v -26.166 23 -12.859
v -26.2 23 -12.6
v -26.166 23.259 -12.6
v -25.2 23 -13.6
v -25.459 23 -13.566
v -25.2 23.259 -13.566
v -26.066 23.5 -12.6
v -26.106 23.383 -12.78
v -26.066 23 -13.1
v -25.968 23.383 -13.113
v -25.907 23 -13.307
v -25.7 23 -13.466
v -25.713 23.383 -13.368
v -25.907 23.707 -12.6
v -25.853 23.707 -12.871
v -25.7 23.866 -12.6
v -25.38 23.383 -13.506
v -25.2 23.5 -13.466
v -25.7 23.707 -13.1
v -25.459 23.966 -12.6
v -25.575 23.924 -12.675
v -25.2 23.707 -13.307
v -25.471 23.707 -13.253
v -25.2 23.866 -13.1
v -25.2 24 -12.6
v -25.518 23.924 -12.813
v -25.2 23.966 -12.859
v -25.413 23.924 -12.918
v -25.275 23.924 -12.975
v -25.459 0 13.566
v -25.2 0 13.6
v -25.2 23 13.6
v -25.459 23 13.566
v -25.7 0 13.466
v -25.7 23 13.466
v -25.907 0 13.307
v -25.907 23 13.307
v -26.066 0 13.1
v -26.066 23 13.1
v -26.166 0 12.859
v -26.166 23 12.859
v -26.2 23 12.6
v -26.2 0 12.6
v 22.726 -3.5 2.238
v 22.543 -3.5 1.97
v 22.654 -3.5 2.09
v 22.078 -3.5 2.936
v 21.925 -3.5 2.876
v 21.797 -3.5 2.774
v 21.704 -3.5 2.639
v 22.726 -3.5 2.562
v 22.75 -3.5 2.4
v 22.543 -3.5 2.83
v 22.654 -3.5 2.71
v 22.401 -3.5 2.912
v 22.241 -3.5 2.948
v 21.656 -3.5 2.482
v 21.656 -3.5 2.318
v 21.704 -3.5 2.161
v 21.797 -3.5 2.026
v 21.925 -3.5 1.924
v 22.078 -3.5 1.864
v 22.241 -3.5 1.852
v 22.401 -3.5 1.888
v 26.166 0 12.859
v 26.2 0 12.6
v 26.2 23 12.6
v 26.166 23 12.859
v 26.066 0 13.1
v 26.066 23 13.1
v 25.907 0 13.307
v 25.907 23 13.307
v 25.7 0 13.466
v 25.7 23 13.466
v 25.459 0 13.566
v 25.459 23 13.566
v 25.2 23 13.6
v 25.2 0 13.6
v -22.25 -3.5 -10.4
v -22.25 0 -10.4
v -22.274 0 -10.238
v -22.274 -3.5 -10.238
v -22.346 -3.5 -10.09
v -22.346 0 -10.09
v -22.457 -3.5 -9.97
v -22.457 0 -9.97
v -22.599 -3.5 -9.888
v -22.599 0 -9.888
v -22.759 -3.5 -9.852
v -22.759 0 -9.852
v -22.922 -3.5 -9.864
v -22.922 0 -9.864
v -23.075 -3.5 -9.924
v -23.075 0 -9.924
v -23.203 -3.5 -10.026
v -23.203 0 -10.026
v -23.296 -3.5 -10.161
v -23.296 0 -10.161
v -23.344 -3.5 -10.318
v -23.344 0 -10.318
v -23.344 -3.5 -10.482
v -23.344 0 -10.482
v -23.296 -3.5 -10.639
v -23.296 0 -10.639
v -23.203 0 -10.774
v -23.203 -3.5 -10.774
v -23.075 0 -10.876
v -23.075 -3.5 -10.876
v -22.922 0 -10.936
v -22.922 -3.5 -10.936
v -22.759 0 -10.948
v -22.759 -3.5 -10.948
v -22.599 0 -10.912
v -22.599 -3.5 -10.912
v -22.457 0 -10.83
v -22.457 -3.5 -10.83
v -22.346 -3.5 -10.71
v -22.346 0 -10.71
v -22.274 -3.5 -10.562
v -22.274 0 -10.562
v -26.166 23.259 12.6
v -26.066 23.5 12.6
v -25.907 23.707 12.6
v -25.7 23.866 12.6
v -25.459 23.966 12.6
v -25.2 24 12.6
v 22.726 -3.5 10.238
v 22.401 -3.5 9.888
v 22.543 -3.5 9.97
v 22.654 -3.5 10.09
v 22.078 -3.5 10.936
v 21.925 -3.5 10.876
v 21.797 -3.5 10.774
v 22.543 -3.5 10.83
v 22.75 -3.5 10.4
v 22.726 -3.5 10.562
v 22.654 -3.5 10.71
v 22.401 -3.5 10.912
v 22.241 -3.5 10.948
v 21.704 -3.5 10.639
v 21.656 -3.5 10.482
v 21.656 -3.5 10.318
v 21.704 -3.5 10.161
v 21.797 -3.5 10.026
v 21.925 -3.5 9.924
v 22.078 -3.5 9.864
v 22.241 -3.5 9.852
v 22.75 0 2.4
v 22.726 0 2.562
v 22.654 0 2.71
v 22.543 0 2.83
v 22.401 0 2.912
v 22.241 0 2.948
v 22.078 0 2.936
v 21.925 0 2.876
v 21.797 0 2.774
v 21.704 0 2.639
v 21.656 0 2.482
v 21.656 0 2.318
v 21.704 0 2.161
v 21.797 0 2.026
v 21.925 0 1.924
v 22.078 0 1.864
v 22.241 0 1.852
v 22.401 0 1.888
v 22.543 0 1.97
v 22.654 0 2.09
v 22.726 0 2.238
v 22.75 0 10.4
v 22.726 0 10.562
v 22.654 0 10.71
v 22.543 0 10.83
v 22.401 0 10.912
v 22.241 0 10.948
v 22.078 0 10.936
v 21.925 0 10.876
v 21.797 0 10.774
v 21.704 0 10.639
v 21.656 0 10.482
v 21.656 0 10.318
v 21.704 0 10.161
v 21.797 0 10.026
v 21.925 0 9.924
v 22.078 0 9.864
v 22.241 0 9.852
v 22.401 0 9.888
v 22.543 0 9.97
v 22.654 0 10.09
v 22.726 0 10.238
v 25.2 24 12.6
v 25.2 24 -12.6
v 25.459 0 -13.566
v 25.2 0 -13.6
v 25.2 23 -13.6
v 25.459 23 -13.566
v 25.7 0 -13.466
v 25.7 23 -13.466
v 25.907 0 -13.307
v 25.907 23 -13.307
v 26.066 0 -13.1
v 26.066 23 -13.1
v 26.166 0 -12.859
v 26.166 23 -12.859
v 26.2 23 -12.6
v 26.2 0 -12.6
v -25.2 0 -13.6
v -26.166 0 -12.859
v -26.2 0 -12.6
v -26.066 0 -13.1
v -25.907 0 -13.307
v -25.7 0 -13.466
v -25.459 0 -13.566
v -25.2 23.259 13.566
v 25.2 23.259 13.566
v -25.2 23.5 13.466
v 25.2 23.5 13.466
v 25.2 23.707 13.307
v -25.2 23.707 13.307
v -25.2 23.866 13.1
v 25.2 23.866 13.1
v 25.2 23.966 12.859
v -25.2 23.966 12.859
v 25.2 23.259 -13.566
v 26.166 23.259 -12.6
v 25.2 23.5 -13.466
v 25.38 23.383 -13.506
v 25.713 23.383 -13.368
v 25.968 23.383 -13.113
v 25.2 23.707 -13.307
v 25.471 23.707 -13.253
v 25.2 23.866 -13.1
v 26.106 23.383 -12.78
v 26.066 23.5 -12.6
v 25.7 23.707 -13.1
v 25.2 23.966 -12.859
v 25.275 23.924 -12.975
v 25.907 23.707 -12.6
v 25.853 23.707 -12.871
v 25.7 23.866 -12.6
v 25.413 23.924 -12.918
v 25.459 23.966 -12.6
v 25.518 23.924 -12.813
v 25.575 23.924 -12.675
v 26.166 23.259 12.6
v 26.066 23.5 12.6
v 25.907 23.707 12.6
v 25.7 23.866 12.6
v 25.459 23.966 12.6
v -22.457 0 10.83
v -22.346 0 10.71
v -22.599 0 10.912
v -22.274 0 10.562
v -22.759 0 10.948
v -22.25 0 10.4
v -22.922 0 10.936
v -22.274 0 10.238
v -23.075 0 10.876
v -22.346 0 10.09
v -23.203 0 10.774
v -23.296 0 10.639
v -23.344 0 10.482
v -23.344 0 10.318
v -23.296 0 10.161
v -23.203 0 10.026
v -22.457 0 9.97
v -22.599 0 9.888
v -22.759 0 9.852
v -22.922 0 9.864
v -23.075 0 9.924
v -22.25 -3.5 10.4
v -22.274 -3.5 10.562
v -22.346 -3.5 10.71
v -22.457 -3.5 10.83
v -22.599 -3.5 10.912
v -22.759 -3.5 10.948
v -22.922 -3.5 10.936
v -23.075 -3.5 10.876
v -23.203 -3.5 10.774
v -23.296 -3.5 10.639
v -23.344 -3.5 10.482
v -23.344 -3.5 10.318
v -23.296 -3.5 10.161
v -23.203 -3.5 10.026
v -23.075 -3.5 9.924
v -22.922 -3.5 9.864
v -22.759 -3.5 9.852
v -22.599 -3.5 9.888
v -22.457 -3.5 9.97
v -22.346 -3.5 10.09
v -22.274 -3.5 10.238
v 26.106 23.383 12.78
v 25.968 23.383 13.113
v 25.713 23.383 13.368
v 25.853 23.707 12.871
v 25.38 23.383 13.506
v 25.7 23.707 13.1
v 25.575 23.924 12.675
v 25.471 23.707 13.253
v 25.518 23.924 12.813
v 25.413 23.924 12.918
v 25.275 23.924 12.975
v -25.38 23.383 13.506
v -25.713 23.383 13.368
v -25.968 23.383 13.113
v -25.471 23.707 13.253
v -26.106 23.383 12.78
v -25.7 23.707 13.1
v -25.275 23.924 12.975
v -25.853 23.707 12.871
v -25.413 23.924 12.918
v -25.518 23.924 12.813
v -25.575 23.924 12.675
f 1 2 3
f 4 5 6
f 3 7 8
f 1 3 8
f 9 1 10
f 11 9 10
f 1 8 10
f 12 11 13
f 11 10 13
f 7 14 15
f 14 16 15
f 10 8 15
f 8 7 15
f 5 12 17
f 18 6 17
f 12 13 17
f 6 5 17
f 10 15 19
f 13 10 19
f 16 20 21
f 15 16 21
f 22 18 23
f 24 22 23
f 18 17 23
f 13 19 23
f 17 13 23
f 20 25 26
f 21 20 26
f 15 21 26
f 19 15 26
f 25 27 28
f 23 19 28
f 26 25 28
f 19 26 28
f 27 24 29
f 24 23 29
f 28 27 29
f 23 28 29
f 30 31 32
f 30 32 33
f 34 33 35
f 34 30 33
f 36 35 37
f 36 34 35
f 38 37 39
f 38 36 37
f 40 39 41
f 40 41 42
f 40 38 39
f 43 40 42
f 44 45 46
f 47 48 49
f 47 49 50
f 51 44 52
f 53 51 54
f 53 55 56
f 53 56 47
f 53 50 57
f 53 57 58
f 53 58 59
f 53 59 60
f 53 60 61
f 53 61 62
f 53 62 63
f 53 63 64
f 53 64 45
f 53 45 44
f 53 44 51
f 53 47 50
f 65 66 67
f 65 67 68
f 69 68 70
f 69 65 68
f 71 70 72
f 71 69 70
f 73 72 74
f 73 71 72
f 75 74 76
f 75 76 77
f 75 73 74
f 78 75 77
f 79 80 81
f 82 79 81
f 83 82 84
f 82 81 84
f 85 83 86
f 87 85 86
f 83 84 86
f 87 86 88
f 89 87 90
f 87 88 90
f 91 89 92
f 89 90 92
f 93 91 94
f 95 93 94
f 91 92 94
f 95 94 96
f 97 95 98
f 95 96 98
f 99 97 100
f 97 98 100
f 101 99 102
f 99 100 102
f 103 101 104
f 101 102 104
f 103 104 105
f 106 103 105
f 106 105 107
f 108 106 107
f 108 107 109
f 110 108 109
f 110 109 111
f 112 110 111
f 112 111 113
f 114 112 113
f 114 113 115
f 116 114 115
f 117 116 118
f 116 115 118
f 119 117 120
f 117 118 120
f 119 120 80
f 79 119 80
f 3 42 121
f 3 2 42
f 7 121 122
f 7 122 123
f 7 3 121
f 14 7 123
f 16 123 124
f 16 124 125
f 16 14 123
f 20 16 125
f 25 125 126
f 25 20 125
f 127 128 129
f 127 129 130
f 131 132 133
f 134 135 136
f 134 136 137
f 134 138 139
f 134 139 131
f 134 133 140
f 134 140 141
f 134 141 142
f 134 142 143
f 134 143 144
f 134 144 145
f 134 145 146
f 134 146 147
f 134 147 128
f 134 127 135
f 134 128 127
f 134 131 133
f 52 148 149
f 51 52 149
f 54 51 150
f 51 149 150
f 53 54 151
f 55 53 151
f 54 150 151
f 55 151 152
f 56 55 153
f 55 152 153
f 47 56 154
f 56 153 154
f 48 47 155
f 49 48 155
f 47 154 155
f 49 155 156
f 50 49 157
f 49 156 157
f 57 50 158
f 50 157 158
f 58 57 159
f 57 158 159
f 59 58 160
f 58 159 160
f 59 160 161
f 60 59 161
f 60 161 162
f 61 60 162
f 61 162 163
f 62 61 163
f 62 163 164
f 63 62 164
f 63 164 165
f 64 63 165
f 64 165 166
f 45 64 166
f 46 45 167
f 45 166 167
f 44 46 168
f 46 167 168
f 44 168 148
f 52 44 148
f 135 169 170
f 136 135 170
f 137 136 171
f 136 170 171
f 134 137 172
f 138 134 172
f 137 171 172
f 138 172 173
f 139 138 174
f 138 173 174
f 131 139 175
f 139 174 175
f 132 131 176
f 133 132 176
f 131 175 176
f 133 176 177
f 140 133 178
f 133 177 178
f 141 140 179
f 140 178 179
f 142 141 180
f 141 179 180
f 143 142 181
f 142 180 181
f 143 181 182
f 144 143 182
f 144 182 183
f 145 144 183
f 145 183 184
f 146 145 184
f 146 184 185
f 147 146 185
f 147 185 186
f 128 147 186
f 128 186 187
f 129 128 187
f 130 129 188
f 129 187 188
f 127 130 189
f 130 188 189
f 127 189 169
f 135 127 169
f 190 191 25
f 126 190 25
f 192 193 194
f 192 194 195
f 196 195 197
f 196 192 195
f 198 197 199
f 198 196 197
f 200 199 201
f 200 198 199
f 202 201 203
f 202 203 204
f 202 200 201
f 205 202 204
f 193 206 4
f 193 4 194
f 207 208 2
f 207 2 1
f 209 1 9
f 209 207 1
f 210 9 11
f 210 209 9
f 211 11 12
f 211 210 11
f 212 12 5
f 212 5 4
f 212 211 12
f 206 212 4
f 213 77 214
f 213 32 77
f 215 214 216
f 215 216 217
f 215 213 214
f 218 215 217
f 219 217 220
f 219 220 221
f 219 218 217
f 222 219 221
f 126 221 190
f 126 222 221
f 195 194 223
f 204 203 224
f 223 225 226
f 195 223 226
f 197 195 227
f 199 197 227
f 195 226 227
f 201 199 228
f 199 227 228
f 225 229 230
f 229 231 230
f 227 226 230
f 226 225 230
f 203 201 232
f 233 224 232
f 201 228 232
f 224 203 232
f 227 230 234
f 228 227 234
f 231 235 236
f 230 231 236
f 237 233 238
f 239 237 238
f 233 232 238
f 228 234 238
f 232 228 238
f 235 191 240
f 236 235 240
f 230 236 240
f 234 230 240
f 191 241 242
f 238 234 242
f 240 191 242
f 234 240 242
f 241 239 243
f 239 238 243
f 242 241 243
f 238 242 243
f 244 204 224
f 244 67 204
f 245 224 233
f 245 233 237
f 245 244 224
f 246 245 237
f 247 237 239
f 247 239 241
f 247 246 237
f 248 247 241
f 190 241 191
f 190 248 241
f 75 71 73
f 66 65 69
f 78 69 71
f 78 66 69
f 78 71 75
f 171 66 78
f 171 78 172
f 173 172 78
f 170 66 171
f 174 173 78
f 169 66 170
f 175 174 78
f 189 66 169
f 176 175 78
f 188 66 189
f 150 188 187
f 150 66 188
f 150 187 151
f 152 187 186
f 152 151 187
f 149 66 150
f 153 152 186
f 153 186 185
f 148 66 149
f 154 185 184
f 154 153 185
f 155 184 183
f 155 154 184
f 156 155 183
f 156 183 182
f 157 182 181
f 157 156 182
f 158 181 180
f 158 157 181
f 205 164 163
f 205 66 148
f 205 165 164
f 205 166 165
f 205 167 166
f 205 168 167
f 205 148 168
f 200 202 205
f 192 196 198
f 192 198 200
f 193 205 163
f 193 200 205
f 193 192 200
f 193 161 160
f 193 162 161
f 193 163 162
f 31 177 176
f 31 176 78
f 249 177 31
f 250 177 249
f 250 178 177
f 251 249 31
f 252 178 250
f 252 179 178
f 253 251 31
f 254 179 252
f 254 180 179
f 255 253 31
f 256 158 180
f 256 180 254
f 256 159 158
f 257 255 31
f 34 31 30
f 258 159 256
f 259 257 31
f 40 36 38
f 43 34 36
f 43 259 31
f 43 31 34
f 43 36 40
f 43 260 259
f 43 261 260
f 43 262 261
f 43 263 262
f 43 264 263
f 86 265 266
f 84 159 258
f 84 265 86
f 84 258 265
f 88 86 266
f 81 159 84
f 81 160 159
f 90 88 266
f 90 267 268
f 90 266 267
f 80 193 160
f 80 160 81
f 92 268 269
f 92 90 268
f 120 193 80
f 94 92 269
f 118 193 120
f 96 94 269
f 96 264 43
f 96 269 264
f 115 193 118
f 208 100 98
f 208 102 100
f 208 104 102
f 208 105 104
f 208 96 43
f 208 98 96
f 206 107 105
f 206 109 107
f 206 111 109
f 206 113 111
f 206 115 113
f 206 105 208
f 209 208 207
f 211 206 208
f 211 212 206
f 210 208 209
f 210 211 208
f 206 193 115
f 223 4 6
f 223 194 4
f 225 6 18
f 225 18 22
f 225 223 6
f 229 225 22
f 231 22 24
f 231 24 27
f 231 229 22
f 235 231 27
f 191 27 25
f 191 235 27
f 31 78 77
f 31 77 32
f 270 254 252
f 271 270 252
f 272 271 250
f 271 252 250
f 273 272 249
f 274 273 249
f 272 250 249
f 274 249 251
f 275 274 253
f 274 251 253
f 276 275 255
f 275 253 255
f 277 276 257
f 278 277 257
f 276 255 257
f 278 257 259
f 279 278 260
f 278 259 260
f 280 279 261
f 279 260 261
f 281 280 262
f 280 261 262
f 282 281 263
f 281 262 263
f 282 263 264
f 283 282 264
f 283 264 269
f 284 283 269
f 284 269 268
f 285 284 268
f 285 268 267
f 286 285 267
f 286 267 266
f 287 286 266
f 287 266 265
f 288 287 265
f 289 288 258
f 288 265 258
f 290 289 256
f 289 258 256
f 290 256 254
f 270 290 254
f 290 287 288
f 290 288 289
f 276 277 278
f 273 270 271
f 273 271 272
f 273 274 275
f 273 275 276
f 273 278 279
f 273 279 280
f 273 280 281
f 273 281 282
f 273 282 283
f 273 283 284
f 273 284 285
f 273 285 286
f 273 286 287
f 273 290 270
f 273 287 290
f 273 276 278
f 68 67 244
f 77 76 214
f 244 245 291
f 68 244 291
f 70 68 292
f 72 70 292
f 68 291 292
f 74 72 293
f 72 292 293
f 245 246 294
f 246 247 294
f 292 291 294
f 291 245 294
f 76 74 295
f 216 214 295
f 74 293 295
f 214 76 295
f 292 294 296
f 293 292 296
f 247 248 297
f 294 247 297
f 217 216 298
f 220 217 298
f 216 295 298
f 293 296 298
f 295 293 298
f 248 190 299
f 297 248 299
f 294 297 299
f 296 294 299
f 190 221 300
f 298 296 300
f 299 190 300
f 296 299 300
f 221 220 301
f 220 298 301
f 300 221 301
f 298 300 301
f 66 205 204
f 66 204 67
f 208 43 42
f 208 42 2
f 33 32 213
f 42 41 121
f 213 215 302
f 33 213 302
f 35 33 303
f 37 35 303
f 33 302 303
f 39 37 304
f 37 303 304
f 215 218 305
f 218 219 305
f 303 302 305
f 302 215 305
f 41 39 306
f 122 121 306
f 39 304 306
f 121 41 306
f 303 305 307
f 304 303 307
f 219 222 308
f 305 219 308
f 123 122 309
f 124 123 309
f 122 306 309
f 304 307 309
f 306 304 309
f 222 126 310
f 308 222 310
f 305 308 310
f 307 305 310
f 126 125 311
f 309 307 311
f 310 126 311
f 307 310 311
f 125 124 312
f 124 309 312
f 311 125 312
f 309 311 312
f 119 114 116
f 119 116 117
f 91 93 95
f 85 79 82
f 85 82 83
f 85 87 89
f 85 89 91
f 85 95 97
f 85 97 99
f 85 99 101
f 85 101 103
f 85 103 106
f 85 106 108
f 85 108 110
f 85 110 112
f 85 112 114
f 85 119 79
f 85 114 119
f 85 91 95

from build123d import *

# Parameters (mm, degrees)
EXTRUDE_1_DEPTH = 24
FILLET_1_R      = 1
SKETCH_870_R    = 0.55
EXTRUDE_2_DEPTH = 3.5


with BuildPart() as part:
    # Эскиз1 → Бобышка-Вытянуть1 (new body)
    with BuildSketch(Plane(origin=(0, 0, 0), x_dir=(1, 0, 0), z_dir=(0, 1, 0))):
        with BuildLine():
            Line((-25.2, 13.6), (25.2, 13.6))
            ThreePointArc((25.2, 13.6), (25.907106781, 13.307106781), (26.2, 12.6))
            Line((26.2, 12.6), (26.2, -12.6))
            ThreePointArc((26.2, -12.6), (25.907106781, -13.307106781), (25.2, -13.6))
            Line((25.2, -13.6), (-25.2, -13.6))
            ThreePointArc((-25.2, -13.6), (-25.907106781, -13.307106781), (-26.2, -12.6))
            Line((-26.2, -12.6), (-26.2, 12.6))
            ThreePointArc((-26.2, 12.6), (-25.907106781, 13.307106781), (-25.2, 13.6))
        make_face()
    extrude(amount=EXTRUDE_1_DEPTH)

    # Скругление1
    fillet_1_edges = [part.edges().sort_by_distance(p)[0] for p in [
        (-25.907106781, 24, -13.307106781),
        (-26.2, 24, 0),
        (-25.907106781, 24, 13.307106781),
        (0, 24, 13.6),
        (25.907106781, 24, 13.307106781),
        (26.2, 24, 0),
        (25.907106781, 24, -13.307106781),
        (0, 24, -13.6),
    ]]
    fillet(fillet_1_edges, radius=FILLET_1_R)

    # Sketch 870 → Бобышка-Вытянуть2 (add)
    with BuildSketch(Plane.XZ):
        with Locations((-22.8, 10.4)):
            Circle(SKETCH_870_R)
        with Locations((-22.8, -10.4)):
            Circle(SKETCH_870_R)
        with Locations((22.2, 10.4)):
            Circle(SKETCH_870_R)
        with Locations((22.2, 2.4)):
            Circle(SKETCH_870_R)
    extrude(amount=EXTRUDE_2_DEPTH)


solid = part.part
